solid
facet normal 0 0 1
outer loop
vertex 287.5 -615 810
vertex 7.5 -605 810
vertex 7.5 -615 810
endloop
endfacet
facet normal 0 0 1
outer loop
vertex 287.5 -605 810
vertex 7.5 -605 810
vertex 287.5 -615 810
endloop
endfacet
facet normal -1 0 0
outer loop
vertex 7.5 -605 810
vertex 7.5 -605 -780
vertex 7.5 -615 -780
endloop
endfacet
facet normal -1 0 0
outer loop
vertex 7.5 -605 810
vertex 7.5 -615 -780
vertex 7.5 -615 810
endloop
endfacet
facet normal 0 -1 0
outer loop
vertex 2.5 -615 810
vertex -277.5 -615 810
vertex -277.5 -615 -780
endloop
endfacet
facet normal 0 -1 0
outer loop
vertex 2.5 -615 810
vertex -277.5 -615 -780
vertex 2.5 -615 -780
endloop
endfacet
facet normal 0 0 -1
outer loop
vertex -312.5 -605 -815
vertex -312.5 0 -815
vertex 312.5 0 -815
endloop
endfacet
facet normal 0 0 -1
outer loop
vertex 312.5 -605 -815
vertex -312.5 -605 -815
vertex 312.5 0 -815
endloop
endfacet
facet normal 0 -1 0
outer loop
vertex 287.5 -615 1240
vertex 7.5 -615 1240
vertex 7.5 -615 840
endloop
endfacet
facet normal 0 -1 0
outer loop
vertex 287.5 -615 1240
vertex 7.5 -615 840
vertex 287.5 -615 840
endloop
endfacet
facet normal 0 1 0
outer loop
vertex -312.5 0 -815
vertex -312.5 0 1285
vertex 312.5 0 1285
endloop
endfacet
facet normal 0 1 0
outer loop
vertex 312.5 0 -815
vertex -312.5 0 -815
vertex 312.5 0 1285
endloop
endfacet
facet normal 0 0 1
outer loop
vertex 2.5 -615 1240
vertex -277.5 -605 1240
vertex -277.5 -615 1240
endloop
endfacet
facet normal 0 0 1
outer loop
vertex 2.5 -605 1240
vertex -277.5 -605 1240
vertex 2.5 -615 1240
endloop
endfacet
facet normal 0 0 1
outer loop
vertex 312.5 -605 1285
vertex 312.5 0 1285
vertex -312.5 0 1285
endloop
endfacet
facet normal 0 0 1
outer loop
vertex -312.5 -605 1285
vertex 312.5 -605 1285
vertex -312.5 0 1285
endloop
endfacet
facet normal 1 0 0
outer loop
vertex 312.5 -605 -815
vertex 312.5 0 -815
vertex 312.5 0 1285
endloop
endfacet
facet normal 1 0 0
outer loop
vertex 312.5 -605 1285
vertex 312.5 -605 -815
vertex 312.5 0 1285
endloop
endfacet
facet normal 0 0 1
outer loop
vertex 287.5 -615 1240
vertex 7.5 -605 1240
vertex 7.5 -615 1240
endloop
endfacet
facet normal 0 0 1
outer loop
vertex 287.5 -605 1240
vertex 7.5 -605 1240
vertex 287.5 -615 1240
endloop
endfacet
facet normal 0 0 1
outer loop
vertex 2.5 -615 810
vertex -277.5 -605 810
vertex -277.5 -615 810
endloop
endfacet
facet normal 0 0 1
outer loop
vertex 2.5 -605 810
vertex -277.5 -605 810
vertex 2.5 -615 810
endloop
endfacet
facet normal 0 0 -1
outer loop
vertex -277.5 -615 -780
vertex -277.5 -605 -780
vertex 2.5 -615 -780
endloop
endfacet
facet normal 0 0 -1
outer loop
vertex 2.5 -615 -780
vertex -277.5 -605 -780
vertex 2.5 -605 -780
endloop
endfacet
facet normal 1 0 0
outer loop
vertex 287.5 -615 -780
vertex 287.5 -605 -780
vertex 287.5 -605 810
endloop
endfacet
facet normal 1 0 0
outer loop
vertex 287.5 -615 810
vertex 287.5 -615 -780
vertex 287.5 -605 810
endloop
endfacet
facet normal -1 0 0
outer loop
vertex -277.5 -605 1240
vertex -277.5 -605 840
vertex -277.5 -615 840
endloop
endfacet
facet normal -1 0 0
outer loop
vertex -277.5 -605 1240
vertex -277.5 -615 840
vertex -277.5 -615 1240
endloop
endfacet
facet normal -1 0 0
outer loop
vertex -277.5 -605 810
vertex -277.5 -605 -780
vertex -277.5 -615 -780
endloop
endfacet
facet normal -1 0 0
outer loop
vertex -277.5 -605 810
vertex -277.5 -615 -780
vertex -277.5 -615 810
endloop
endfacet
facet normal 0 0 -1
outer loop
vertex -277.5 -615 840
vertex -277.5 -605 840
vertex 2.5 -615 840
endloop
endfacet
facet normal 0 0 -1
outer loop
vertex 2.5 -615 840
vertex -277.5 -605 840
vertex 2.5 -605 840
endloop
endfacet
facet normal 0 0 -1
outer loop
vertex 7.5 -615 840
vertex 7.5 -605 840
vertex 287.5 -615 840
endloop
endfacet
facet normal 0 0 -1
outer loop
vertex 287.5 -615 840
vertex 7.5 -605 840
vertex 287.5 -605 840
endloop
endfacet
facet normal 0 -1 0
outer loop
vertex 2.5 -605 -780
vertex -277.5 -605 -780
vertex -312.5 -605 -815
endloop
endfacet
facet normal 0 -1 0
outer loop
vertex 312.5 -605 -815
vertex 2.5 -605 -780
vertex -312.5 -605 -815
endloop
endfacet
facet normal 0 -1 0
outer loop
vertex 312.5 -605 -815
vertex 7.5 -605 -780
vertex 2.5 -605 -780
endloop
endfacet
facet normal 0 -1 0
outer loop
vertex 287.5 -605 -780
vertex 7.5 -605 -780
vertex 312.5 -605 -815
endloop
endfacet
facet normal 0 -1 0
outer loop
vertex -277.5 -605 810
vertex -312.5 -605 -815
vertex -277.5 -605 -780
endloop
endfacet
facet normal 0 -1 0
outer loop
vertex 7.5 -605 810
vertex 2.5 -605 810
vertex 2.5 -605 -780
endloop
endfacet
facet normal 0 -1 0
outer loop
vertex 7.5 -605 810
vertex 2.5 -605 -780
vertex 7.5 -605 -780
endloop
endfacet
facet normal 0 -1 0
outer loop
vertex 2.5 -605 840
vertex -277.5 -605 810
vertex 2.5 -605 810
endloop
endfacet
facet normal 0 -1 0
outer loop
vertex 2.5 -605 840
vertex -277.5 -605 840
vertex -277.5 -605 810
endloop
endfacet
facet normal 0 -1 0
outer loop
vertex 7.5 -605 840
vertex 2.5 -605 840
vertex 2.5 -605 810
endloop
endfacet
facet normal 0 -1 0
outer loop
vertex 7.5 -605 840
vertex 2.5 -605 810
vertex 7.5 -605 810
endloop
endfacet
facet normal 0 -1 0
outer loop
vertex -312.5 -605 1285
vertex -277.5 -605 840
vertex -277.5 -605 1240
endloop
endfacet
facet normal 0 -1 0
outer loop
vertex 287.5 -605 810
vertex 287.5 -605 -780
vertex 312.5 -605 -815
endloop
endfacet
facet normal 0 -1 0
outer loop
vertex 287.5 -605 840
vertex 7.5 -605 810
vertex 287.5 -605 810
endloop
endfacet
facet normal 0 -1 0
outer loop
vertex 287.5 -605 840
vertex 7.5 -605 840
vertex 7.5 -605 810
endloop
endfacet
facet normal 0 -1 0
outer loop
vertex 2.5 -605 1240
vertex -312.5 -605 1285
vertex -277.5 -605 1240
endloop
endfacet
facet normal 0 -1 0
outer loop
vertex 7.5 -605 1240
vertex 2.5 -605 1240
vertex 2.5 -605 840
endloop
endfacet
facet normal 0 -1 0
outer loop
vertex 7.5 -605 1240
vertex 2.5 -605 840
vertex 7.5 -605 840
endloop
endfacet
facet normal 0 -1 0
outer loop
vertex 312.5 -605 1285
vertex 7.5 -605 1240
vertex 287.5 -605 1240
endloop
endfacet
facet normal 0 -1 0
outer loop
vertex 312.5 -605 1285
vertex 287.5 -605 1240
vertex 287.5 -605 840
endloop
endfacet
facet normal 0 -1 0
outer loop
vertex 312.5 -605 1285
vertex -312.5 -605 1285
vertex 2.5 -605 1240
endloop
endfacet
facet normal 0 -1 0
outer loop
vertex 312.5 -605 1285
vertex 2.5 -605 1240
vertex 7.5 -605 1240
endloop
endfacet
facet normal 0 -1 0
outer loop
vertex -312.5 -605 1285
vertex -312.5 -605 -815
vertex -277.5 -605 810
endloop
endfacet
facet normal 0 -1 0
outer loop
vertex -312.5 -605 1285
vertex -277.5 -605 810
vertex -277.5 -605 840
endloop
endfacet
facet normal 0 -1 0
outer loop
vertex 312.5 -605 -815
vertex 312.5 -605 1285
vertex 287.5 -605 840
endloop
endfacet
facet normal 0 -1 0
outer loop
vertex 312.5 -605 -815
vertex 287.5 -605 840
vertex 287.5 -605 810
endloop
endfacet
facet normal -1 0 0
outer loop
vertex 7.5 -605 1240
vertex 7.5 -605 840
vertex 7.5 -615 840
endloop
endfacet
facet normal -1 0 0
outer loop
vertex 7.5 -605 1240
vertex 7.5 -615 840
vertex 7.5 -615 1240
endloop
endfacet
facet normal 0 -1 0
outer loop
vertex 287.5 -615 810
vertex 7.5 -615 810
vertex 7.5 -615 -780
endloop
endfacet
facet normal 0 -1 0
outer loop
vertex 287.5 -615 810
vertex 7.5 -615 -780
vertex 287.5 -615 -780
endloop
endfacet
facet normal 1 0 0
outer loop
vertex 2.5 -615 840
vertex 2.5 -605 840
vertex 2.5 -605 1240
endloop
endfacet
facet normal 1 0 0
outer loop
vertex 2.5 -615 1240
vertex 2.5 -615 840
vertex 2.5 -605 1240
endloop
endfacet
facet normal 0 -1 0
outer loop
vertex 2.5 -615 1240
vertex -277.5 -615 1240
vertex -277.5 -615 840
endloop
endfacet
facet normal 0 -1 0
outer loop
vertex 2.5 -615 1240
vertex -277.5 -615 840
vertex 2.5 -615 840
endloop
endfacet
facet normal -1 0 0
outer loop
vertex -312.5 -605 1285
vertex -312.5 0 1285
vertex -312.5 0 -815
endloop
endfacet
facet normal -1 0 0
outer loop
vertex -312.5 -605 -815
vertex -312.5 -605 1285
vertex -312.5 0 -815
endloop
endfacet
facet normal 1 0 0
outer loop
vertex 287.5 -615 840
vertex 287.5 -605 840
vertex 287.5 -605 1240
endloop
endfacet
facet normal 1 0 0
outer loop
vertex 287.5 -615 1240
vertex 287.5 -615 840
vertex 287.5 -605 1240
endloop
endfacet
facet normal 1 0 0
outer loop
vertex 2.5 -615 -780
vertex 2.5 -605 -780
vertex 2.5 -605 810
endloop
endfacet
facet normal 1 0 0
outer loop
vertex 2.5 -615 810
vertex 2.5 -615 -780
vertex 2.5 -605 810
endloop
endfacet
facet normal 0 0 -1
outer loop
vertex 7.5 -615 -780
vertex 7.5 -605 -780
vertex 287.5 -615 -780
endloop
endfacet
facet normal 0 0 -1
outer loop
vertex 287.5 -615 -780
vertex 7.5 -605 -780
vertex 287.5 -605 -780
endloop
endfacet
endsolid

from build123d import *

# Parameters (mm, degrees)
F1_DEPTH = 605
F2_W     = 280
F2_H     = 400
F2_H_2   = 1590
F3_DEPTH = 10


with BuildPart() as f1:
    # F0 (on Front) → F1 (new body)
    with BuildSketch(Plane.XZ):
        Polygon((312.5, -689.526498), (312.5, 1285), (-312.5, 1285), (-312.5, -689.526498), (-312.5, -815), (312.5, -815), align=None)
    extrude(amount=F1_DEPTH)

    # F2 (on face) → F3 (join)
    with BuildSketch(Plane.XZ.offset(605)):
        with Locations((-137.5, 1040)):
            Rectangle(F2_W, F2_H)
        with Locations((147.5, 1040)):
            Rectangle(F2_W, F2_H)
        with Locations((-137.5, 15)):
            Rectangle(F2_W, F2_H_2)
        with Locations((147.5, 15)):
            Rectangle(F2_W, F2_H_2)
    extrude(amount=F3_DEPTH)


solid = f1.part
